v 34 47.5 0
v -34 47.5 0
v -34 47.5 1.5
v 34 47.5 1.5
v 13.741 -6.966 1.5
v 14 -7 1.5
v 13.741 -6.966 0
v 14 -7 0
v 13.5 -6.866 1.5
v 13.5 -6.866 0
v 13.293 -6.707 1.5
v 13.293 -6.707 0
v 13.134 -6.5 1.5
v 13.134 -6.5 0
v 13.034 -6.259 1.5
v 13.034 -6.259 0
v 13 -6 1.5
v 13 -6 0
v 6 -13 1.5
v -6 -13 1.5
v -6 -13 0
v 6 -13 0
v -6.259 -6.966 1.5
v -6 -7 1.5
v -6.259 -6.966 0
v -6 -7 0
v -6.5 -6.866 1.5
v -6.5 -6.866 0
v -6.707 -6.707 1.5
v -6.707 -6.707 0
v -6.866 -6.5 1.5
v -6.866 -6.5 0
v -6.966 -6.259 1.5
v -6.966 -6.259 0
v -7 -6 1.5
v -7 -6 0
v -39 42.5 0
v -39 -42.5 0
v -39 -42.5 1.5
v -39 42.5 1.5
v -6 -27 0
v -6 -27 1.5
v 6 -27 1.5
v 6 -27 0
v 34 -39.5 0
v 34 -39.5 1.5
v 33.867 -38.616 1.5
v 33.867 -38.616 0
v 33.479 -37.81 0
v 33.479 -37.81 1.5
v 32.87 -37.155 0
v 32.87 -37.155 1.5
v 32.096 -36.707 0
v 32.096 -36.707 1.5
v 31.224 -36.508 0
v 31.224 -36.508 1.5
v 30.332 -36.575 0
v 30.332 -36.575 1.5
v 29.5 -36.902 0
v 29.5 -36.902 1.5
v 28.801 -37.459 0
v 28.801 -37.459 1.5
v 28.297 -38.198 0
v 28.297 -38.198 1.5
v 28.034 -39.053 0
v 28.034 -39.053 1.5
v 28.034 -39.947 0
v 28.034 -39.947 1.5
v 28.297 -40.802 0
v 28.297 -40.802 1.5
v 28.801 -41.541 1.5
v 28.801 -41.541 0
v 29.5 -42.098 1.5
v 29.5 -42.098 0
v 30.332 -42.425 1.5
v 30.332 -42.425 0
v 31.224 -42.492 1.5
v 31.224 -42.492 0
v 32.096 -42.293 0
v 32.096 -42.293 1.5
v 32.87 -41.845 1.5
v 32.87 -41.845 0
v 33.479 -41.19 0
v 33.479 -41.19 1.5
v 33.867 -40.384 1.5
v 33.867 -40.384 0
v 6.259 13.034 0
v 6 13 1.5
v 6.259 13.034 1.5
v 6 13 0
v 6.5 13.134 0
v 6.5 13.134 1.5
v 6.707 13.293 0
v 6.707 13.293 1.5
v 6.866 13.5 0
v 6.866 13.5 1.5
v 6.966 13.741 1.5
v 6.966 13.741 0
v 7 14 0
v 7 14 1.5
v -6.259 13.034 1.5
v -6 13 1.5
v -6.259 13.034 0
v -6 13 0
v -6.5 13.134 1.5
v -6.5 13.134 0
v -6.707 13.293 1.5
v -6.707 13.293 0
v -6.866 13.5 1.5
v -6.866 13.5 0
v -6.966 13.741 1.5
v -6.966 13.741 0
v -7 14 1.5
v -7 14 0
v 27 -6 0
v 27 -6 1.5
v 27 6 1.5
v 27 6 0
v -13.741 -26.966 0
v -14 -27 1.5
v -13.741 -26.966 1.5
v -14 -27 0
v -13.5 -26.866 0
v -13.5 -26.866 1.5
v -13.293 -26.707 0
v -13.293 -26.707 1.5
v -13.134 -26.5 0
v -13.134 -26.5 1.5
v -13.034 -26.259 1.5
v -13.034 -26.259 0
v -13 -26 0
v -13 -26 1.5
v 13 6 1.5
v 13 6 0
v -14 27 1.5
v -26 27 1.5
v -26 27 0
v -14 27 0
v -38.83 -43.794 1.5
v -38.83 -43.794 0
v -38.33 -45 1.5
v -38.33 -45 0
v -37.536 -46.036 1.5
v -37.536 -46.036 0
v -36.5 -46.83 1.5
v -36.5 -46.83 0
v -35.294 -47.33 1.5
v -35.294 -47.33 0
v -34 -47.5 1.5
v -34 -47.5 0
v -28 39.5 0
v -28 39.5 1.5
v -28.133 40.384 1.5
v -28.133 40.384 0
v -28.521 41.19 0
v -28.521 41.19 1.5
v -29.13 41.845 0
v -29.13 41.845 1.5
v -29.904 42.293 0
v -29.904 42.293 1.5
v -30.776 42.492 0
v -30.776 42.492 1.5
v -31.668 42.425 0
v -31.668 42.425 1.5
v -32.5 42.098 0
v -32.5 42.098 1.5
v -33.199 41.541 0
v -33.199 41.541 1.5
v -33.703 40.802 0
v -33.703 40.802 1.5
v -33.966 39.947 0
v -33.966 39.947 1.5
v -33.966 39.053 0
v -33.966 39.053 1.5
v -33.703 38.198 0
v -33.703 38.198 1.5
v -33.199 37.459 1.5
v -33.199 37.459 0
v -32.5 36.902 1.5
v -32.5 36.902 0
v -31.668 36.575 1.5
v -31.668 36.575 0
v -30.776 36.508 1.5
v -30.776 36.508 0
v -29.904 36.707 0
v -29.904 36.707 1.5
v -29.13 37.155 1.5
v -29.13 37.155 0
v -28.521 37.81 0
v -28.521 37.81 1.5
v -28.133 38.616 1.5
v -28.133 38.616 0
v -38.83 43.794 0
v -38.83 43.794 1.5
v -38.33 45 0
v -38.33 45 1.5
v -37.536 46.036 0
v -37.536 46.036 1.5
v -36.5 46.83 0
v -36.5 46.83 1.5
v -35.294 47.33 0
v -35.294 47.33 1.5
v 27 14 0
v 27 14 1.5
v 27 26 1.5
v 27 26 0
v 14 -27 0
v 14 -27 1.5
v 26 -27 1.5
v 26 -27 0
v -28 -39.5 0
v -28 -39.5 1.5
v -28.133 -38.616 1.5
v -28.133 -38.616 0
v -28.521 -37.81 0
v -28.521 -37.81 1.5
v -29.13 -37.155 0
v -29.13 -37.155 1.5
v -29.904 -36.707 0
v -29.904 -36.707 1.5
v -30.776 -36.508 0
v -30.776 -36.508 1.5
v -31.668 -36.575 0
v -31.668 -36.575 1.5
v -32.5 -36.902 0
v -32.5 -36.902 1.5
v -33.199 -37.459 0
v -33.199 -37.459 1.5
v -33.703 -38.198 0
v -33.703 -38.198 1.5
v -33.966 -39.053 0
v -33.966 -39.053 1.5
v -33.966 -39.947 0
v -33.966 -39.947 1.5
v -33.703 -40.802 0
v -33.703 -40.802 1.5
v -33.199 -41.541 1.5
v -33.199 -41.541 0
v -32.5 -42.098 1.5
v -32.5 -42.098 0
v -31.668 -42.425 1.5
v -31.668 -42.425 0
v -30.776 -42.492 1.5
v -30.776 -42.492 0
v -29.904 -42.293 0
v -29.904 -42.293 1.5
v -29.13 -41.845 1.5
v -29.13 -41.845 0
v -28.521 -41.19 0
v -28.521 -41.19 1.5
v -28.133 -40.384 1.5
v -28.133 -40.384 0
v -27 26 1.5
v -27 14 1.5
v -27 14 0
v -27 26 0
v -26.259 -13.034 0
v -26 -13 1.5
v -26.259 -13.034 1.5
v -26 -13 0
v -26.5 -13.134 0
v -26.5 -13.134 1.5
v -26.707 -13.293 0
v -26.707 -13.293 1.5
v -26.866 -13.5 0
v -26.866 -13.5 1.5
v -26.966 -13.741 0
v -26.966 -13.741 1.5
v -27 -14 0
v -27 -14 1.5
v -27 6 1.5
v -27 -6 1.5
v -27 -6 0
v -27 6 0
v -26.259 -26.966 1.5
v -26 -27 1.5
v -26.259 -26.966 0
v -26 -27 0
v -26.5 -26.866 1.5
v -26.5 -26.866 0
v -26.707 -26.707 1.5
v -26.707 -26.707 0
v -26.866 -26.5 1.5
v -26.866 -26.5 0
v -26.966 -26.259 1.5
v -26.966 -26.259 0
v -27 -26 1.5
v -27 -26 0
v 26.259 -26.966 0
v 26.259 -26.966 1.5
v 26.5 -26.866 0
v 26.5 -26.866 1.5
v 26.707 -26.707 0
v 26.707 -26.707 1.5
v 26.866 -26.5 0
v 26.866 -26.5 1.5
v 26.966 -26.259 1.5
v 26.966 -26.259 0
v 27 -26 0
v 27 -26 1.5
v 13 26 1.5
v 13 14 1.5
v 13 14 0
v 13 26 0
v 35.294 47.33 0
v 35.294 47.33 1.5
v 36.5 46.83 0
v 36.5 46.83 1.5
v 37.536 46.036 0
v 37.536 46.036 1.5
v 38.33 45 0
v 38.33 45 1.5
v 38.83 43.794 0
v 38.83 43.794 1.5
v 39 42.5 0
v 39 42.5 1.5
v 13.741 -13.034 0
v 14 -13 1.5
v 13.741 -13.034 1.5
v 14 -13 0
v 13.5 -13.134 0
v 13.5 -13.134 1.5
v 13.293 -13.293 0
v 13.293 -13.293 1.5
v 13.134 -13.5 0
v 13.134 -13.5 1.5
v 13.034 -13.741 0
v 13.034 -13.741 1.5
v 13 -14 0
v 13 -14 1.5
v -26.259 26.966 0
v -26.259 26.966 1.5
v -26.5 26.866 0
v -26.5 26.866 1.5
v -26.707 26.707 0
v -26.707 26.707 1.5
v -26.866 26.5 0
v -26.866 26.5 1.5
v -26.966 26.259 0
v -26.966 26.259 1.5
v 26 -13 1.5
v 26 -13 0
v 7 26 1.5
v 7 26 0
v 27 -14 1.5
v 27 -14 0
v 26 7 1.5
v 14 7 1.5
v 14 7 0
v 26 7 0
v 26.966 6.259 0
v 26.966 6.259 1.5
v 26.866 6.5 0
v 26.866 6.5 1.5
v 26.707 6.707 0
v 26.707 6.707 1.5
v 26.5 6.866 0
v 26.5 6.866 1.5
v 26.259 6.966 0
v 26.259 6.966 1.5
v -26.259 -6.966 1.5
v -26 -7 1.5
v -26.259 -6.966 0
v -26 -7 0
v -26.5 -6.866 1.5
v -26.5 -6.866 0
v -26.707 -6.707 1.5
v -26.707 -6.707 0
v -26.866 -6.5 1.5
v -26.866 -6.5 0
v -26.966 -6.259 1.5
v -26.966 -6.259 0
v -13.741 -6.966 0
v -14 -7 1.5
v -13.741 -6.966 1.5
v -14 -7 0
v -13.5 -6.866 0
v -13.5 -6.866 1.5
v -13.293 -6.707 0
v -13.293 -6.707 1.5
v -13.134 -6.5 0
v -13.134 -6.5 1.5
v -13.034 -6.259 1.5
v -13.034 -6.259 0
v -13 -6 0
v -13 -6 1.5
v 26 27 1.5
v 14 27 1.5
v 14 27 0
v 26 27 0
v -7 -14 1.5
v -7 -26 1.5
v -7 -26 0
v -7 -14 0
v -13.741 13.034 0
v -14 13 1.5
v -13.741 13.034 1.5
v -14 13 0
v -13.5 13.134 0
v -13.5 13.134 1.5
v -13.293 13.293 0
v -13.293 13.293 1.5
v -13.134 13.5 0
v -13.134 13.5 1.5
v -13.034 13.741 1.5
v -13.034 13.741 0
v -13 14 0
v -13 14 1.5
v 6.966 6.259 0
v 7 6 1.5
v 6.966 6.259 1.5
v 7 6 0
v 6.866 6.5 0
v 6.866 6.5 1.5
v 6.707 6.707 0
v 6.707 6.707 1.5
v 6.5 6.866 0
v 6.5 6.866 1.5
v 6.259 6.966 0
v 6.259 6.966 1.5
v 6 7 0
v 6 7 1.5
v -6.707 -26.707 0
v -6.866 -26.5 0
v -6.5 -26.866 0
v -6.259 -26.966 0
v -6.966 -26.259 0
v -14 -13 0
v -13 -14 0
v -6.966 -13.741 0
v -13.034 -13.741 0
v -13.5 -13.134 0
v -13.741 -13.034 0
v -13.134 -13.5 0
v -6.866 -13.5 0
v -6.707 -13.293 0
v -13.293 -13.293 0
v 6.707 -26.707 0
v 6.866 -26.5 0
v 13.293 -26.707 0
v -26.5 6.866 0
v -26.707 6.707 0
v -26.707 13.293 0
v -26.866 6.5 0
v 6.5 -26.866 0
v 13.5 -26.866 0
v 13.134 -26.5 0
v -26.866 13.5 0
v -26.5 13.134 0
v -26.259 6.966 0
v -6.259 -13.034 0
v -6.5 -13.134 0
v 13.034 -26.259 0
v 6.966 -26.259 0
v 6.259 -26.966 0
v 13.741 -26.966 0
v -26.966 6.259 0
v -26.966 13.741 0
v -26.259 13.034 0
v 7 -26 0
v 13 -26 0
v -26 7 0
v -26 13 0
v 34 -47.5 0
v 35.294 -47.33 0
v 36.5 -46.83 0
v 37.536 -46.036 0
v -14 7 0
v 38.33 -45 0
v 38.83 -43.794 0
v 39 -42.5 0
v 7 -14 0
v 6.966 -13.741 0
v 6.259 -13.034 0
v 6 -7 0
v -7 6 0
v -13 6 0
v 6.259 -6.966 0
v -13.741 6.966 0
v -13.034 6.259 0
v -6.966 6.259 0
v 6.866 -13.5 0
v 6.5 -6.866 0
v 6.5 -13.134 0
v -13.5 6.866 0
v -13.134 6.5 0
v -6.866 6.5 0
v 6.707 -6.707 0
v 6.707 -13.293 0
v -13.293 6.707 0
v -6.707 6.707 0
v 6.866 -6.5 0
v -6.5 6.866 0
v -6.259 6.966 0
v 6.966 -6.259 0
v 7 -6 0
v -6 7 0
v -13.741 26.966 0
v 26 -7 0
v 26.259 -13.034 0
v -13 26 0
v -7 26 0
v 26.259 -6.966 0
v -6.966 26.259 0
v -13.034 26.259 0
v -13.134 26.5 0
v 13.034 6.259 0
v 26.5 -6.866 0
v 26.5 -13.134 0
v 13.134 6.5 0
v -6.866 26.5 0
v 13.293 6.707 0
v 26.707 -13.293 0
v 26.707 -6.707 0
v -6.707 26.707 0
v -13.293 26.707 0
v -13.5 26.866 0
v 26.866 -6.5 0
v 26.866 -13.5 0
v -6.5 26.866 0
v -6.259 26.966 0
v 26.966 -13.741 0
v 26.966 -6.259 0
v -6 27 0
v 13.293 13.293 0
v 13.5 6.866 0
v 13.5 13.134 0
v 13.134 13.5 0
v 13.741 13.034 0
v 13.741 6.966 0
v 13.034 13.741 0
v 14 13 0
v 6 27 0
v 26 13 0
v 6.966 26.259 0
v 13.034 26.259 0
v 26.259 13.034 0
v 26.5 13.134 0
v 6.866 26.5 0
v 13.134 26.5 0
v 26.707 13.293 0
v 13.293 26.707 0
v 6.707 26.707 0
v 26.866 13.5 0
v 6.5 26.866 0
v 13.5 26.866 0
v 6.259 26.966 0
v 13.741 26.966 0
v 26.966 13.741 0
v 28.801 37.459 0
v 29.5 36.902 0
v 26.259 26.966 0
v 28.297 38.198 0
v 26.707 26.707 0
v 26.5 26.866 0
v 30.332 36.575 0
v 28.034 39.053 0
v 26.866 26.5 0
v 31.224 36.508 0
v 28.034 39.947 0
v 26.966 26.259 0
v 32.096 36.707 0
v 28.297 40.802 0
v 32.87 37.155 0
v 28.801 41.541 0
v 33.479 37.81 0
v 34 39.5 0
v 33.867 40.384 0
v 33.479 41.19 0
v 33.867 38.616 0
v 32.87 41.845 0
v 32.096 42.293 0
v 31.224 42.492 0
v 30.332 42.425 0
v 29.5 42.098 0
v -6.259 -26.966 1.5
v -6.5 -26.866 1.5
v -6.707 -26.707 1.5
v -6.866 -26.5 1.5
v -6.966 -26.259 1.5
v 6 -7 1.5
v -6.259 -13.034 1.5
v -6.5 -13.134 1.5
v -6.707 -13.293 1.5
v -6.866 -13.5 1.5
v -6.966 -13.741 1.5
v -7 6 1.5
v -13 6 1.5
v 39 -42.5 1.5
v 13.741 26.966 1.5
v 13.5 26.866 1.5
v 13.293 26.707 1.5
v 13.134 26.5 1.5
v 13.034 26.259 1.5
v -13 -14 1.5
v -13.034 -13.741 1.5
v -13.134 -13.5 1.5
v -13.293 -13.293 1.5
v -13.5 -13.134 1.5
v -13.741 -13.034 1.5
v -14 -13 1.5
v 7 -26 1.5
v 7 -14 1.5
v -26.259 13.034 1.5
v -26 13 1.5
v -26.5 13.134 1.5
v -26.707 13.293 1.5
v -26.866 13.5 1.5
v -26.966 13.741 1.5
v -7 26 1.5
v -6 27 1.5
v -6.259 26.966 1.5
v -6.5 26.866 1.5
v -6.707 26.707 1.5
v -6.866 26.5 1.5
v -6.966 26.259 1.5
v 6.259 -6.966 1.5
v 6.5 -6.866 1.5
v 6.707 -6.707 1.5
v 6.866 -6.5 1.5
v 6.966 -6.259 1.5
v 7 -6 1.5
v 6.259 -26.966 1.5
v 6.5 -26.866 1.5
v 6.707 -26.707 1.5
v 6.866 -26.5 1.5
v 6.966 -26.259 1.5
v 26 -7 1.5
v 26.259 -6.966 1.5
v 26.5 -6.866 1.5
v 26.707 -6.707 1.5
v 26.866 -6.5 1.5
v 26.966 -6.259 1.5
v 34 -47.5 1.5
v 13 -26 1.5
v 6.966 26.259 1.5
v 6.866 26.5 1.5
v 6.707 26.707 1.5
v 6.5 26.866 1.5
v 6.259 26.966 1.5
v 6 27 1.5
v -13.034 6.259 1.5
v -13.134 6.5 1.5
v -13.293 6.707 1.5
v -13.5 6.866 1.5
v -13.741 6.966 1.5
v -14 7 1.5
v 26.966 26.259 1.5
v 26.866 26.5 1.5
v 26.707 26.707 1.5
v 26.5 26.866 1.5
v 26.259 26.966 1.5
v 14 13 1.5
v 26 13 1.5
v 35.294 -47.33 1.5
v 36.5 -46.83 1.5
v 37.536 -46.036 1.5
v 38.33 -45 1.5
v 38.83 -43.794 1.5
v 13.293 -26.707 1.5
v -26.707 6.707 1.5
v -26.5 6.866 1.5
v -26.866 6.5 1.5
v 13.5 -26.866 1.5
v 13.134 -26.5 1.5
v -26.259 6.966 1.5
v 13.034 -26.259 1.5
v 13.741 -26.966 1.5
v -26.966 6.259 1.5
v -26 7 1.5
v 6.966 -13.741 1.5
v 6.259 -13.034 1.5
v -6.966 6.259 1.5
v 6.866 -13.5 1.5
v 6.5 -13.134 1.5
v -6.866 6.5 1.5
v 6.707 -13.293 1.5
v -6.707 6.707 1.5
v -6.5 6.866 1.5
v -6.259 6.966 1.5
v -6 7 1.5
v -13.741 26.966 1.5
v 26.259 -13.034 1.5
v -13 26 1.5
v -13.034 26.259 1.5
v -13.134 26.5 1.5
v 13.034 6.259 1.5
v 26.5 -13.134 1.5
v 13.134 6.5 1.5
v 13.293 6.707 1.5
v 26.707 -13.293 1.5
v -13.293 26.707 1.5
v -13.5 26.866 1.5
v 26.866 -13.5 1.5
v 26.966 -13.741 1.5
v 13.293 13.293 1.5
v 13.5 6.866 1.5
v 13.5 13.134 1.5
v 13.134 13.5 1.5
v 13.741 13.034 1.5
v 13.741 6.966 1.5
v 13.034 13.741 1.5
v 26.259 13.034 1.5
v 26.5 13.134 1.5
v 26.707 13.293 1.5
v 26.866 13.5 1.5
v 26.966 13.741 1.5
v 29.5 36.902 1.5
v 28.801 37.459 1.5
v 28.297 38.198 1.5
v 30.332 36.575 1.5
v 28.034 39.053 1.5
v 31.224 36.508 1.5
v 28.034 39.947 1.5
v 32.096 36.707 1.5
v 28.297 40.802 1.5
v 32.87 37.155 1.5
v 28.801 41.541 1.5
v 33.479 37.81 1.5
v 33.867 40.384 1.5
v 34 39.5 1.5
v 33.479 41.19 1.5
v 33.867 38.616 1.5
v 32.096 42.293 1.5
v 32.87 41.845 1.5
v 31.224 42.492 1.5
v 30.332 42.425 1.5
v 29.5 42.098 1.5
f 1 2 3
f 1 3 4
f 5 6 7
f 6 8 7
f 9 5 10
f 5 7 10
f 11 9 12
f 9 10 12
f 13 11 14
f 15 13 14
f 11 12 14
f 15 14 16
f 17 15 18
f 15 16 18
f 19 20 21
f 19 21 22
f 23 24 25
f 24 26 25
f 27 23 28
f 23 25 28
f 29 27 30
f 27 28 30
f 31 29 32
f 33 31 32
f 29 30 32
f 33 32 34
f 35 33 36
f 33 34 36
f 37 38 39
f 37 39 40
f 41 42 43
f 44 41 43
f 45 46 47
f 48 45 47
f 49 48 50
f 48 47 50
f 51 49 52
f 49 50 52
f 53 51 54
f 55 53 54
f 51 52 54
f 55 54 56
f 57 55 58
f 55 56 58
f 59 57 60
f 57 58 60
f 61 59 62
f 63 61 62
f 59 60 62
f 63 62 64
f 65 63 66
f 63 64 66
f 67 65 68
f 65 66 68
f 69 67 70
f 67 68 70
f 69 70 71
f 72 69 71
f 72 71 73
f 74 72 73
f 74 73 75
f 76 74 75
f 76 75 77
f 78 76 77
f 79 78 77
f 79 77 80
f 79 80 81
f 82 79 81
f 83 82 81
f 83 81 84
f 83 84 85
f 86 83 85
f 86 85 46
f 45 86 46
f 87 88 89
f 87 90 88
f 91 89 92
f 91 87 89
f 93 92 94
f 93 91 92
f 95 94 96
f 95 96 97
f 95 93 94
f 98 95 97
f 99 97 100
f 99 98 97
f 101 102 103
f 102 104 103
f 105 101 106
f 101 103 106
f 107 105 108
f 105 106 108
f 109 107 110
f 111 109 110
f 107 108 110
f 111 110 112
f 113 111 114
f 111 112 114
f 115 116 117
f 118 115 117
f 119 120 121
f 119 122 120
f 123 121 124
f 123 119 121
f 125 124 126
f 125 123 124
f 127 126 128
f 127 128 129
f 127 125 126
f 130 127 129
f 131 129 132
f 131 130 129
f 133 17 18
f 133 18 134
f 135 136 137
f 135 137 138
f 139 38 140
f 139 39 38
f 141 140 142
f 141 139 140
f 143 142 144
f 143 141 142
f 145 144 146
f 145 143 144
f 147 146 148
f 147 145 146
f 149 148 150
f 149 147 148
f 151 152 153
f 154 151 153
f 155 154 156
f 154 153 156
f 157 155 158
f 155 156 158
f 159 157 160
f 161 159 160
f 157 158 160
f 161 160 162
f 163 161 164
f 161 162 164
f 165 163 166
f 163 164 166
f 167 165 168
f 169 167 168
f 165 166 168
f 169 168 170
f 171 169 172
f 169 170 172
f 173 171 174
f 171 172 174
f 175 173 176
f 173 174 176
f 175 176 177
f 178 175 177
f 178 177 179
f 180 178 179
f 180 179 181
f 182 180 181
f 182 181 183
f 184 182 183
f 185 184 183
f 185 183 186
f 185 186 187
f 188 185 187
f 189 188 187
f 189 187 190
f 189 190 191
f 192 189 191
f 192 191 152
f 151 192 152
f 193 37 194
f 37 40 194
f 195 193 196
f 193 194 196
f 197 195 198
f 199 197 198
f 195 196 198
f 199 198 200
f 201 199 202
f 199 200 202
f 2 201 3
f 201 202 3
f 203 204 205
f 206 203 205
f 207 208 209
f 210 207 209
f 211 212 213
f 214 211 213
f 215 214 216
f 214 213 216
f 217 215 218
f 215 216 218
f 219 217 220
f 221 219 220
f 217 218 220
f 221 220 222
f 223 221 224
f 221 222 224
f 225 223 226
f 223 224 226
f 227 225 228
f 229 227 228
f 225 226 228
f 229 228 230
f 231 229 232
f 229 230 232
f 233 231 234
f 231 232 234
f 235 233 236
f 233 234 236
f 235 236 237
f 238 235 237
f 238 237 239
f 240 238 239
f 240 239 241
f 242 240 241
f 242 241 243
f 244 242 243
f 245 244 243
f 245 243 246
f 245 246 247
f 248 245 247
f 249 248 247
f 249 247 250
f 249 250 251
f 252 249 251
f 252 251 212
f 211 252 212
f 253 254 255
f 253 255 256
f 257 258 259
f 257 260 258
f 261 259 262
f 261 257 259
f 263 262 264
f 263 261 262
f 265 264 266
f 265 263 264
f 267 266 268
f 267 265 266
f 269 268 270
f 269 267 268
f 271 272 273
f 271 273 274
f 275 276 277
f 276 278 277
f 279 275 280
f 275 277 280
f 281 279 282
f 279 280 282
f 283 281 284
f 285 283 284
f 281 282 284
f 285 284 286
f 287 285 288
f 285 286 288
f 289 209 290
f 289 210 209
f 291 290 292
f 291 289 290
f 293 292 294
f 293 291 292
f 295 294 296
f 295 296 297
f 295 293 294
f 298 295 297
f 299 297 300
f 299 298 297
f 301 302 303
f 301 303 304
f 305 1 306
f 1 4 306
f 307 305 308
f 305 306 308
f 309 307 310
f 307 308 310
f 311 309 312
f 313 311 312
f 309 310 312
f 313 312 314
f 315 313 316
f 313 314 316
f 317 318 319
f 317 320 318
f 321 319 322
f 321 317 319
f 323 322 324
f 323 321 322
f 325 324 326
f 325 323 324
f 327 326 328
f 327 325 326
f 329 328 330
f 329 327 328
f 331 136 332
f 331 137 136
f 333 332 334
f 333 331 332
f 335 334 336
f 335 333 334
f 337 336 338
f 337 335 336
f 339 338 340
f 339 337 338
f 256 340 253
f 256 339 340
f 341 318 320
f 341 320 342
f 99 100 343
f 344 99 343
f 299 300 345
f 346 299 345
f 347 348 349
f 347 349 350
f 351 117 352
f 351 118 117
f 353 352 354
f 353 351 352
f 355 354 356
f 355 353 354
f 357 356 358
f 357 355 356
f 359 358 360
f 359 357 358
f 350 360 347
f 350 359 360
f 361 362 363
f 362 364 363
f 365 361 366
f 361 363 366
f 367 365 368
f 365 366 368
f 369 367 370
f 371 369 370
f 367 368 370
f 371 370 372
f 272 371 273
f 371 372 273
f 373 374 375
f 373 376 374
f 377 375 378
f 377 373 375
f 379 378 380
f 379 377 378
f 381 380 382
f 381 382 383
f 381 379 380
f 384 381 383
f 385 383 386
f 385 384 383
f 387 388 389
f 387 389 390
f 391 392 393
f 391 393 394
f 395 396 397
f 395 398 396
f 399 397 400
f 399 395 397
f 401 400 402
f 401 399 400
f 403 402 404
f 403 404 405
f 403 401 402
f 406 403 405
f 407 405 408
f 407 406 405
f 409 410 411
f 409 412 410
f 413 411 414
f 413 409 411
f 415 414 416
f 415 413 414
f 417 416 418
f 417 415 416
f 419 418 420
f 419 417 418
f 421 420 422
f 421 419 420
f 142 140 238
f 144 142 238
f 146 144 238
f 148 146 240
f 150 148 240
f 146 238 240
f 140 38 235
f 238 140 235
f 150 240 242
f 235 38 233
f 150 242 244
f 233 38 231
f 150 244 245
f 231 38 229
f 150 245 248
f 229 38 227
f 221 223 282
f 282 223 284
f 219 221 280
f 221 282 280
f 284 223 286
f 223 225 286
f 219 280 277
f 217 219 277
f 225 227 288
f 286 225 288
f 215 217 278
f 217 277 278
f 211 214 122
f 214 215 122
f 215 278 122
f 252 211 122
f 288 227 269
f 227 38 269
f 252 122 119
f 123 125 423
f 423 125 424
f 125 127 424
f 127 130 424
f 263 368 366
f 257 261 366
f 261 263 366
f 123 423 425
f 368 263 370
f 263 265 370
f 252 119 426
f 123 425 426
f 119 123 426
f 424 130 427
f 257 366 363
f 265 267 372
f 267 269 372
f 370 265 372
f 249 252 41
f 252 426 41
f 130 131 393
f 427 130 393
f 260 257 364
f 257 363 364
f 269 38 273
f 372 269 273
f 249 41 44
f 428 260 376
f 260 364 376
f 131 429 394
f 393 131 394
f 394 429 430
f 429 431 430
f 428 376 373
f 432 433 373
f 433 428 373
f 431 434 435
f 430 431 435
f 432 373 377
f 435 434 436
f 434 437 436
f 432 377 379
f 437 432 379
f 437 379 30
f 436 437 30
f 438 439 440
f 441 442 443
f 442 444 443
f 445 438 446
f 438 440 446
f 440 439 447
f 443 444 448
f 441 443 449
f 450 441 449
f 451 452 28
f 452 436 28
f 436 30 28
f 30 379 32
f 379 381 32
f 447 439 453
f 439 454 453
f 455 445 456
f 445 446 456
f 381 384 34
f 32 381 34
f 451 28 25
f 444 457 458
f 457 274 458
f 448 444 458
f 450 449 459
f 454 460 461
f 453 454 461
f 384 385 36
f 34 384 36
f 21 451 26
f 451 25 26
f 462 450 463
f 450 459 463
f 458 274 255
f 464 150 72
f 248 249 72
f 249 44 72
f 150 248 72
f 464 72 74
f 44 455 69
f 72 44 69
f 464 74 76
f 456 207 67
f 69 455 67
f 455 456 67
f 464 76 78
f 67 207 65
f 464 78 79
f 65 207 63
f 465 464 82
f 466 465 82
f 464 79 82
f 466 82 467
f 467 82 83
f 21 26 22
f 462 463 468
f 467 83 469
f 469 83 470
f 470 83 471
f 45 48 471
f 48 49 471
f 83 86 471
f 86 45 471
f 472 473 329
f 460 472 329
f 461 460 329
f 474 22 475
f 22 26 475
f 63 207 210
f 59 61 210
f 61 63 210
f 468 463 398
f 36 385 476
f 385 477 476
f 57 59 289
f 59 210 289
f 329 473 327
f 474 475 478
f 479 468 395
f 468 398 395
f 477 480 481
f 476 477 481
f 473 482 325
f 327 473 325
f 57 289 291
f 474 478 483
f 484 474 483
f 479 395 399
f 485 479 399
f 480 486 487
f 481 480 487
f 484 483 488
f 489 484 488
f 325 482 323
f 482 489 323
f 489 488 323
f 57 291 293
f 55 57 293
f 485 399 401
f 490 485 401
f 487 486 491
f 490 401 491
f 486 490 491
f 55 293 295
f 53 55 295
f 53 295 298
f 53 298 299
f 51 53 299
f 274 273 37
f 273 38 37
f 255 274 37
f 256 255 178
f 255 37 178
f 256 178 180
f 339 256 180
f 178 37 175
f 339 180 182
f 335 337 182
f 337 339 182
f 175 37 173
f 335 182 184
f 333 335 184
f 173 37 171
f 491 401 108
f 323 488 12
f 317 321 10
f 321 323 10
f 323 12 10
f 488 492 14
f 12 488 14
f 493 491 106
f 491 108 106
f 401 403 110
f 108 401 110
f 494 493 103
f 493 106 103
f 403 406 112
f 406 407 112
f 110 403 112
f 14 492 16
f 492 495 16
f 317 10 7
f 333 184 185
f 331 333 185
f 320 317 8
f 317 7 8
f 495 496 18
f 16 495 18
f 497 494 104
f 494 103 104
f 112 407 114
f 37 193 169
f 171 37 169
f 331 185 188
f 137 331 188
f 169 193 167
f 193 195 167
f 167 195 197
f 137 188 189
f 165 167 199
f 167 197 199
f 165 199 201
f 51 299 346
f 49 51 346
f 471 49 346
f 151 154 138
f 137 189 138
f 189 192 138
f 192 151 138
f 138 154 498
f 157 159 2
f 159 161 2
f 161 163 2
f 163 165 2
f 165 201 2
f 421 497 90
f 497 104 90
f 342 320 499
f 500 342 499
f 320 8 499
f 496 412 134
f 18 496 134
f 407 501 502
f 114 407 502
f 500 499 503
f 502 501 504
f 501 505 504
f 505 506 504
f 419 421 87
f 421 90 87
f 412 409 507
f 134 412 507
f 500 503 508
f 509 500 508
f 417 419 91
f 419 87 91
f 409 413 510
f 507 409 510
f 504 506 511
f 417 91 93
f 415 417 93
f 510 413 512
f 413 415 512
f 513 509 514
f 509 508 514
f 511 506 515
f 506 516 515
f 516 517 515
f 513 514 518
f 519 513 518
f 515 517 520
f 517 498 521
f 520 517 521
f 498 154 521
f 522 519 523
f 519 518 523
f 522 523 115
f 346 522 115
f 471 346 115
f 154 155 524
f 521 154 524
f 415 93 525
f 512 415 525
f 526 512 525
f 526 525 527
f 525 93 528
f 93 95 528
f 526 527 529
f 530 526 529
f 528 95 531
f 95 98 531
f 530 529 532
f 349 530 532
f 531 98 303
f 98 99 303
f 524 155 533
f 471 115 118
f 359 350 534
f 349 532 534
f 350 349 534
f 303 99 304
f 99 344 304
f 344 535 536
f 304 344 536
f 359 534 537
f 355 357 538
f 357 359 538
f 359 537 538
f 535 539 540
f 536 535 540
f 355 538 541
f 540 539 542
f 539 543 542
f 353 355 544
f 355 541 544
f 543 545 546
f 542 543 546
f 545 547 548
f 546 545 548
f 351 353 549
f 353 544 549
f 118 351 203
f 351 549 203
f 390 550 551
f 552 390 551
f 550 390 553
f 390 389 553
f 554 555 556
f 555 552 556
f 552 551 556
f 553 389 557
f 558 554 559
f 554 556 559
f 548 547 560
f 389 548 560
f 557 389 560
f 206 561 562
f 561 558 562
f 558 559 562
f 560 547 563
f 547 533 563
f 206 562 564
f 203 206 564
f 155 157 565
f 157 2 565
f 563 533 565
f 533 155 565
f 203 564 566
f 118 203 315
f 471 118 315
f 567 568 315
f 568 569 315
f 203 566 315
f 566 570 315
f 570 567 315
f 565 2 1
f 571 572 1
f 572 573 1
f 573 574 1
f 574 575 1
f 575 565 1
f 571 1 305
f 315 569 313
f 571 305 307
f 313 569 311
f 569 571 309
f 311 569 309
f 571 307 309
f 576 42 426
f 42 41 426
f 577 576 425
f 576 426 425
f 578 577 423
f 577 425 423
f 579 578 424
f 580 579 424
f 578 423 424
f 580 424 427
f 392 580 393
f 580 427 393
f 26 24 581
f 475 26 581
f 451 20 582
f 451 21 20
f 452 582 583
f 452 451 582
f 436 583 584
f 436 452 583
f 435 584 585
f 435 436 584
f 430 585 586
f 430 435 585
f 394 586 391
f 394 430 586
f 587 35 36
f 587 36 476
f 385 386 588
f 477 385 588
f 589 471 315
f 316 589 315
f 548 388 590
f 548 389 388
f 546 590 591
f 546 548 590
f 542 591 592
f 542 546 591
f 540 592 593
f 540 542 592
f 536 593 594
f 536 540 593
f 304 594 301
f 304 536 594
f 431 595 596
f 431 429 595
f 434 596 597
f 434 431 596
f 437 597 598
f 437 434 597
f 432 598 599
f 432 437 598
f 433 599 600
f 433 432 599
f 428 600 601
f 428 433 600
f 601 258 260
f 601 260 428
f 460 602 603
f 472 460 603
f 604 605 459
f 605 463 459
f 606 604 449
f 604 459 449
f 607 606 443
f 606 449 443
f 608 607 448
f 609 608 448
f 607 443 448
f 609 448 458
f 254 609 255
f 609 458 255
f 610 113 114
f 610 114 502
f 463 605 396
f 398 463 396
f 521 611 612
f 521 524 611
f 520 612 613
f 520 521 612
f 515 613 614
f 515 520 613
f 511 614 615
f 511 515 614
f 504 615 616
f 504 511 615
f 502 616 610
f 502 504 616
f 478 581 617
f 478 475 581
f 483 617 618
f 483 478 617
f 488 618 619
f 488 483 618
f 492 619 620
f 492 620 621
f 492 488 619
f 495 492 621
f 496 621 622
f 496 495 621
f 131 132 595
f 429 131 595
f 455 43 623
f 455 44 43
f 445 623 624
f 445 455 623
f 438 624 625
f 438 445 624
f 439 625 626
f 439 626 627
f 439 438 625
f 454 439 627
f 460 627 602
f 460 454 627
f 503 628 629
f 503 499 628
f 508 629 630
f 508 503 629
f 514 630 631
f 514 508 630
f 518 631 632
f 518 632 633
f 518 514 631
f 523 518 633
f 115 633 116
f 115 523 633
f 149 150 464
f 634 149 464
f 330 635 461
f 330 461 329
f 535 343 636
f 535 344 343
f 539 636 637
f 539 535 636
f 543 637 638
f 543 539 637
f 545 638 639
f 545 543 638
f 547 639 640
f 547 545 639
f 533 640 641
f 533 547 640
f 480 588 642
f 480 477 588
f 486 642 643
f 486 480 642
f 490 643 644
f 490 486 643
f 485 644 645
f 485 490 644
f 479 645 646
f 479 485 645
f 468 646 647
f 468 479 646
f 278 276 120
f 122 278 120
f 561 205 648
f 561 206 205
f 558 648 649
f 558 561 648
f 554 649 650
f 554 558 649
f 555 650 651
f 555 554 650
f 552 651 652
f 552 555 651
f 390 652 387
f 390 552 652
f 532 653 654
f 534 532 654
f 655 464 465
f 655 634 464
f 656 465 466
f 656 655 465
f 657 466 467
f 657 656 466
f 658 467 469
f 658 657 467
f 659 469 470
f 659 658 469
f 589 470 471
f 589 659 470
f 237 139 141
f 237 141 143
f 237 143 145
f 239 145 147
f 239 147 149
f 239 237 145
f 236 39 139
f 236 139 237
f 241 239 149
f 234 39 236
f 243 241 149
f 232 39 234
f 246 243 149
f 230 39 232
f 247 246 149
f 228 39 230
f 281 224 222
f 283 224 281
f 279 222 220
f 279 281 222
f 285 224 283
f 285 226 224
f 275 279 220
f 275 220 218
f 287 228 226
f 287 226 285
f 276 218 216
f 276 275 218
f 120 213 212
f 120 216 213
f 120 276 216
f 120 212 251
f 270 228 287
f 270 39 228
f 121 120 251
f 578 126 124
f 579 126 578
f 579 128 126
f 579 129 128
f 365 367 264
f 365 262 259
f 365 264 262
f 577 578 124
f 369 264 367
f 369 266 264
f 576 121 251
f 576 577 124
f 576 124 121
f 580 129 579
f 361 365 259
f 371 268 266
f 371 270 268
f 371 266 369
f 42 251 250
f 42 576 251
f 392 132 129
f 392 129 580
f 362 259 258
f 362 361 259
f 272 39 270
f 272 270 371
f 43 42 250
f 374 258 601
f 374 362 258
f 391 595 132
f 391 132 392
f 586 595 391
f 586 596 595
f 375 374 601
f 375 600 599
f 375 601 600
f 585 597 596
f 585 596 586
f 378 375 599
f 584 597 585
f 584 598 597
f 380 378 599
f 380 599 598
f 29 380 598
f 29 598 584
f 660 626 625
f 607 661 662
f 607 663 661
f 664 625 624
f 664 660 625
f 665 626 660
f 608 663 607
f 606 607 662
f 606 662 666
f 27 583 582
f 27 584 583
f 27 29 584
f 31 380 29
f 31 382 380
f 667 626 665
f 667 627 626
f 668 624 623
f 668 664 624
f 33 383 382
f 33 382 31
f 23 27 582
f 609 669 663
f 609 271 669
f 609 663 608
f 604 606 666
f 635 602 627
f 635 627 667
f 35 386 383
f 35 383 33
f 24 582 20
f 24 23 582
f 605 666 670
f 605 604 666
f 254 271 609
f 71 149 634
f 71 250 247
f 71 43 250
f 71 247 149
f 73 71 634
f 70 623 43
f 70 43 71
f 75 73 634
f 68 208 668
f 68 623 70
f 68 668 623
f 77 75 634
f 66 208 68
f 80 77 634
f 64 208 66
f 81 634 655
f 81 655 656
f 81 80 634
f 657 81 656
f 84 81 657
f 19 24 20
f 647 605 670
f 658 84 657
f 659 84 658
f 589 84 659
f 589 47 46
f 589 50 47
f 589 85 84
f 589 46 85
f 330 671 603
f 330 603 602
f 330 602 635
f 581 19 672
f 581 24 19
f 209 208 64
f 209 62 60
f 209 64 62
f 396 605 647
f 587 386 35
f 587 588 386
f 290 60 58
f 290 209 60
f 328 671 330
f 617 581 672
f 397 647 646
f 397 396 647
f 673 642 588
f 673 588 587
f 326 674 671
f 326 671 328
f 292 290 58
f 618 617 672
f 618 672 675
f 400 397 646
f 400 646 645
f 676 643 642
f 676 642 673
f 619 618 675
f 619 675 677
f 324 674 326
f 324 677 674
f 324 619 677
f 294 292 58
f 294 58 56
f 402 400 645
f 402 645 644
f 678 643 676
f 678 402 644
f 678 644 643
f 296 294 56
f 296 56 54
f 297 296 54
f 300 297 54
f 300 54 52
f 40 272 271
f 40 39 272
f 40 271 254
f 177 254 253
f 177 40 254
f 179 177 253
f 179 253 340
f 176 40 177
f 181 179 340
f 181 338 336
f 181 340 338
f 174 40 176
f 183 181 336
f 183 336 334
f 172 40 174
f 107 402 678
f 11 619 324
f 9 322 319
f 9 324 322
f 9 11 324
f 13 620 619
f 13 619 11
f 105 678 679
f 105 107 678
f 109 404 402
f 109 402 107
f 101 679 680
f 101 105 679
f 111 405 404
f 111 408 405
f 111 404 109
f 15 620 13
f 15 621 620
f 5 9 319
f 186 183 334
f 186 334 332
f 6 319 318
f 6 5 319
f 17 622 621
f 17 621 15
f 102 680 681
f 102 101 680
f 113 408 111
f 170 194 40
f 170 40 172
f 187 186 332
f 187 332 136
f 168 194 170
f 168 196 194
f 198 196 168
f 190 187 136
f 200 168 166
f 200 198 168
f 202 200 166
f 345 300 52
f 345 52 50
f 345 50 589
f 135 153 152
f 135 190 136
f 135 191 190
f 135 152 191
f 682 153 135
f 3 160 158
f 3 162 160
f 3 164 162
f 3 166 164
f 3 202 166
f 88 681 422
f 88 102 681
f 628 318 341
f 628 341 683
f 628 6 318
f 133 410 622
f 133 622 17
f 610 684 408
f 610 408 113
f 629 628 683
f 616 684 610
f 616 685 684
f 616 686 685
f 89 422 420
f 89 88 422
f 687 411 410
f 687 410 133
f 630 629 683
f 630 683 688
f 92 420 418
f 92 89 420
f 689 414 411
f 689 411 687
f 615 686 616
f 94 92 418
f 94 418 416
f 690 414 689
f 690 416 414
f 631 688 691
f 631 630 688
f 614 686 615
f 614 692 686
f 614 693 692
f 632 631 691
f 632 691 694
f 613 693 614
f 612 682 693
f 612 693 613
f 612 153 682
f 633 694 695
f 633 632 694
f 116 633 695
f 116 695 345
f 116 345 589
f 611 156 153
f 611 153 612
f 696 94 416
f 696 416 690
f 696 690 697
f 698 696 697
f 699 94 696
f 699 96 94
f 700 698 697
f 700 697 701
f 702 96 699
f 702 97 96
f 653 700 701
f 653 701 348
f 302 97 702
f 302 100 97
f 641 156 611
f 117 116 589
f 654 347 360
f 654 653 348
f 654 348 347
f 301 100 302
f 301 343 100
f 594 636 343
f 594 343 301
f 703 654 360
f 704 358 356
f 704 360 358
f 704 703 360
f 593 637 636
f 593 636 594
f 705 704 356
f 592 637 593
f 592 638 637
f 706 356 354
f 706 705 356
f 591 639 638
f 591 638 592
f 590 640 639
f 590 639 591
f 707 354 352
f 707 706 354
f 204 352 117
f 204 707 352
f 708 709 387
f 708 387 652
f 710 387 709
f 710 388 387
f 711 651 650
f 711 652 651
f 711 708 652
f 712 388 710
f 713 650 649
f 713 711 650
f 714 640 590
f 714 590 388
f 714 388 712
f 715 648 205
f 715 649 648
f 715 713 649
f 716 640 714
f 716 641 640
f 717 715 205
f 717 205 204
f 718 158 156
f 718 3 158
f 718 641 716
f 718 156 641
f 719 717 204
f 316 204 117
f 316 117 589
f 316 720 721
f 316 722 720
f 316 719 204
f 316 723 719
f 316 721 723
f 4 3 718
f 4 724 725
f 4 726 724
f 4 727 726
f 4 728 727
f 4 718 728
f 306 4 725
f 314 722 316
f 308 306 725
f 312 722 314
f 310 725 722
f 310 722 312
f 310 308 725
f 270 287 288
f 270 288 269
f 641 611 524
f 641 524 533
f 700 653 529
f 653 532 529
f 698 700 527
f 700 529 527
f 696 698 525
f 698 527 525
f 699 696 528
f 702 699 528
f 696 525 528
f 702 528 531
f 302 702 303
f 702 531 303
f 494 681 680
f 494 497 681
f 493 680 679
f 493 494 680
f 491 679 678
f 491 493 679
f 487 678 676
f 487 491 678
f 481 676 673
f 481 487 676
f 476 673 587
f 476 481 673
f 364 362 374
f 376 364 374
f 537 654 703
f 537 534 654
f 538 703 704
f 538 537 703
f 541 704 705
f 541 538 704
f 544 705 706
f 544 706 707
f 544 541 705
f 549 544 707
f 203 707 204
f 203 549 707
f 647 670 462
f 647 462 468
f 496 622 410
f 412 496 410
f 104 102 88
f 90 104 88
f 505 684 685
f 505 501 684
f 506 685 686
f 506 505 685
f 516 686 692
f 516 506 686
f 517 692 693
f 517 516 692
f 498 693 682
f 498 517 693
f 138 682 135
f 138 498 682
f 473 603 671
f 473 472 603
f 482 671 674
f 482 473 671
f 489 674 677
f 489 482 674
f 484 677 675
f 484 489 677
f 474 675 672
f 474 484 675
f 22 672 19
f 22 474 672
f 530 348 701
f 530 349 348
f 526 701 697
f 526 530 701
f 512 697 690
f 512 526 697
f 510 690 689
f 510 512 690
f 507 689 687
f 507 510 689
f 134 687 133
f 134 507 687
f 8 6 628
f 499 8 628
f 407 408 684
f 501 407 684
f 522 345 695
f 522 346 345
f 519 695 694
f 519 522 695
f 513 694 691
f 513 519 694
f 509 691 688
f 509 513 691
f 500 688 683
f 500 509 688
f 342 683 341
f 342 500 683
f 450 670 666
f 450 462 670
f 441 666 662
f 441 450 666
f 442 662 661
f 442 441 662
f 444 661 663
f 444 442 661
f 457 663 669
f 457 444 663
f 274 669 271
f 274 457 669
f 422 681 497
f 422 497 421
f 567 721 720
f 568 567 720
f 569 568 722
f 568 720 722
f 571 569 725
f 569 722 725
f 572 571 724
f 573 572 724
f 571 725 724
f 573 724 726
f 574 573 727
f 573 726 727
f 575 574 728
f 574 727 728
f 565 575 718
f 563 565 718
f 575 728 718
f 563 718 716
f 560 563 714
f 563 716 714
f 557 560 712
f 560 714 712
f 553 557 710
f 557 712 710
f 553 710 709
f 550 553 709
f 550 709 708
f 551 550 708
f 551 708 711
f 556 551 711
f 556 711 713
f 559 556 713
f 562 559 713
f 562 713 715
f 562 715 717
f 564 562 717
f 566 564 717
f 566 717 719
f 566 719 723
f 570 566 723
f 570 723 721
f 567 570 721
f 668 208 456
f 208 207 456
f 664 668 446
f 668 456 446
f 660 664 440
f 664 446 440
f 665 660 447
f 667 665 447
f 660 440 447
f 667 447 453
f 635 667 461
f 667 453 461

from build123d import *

# Parameters (mm, degrees)
SKETCH_W        = 78
SKETCH_H        = 95
PAD_DEPTH       = 1.5
SKETCH002_W     = 14
SKETCH002_H     = 14
POCKET_DEPTH    = 1.501
FILLET_R        = 1
SKETCH003_R     = 3
POCKET001_DEPTH = 1.501
FILLET001_R     = 5


with BuildPart() as part:
    # Sketch → Pad (new body)
    with BuildSketch(Plane.XY):
        Rectangle(SKETCH_W, SKETCH_H)
    extrude(amount=PAD_DEPTH)

    # Sketch002 (on Face6 of Pad) → Pocket (cut, through all)
    with BuildSketch(Plane.XY.offset(1.5)):
        with Locations((-20, 20)):
            Rectangle(SKETCH002_W, SKETCH002_H)
        with Locations((0, 20)):
            Rectangle(SKETCH002_W, SKETCH002_H)
        with Locations((20, 20)):
            Rectangle(SKETCH002_W, SKETCH002_H)
        with Locations((-20, 0)):
            Rectangle(SKETCH002_W, SKETCH002_H)
        Rectangle(SKETCH002_W, SKETCH002_H)
        with Locations((20, 0)):
            Rectangle(SKETCH002_W, SKETCH002_H)
        with Locations((-20, -20)):
            Rectangle(SKETCH002_W, SKETCH002_H)
        with Locations((0, -20)):
            Rectangle(SKETCH002_W, SKETCH002_H)
        with Locations((20, -20)):
            Rectangle(SKETCH002_W, SKETCH002_H)
    extrude(amount=-POCKET_DEPTH, mode=Mode.SUBTRACT)

    # Fillet
    fillet_edges = [part.edges().sort_by_distance(p)[0] for p in [
        (-27, 27, 0.75),
        (-27, 7, 0.75),
        (-27, -13, 0.75),
        (-7, 27, 0.75),
        (-7, 7, 0.75),
        (-7, -13, 0.75),
        (13, -13, 0.75),
        (13, 7, 0.75),
        (13, 27, 0.75),
        (-13, 27, 0.75),
        (7, 27, 0.75),
        (27, 27, 0.75),
        (-13, 7, 0.75),
        (7, 7, 0.75),
        (27, 7, 0.75),
        (-13, -13, 0.75),
        (7, -13, 0.75),
        (27, -13, 0.75),
        (27, 13, 0.75),
        (7, 13, 0.75),
        (-13, 13, 0.75),
        (27, -7, 0.75),
        (7, -7, 0.75),
        (-13, -7, 0.75),
        (27, -27, 0.75),
        (7, -27, 0.75),
        (-13, -27, 0.75),
        (13, -27, 0.75),
        (-7, -27, 0.75),
        (-27, -27, 0.75),
        (13, -7, 0.75),
        (-7, -7, 0.75),
        (-27, -7, 0.75),
        (13, 13, 0.75),
        (-7, 13, 0.75),
        (-27, 13, 0.75),
    ]]
    fillet(fillet_edges, radius=FILLET_R)

    # Sketch003 (on Face78 of Fillet) → Pocket001 (cut, through all)
    with BuildSketch(Plane.XY.offset(1.5)):
        with Locations((-31, 39.5)):
            Circle(SKETCH003_R)
        with Locations((31, 39.5)):
            Circle(SKETCH003_R)
        with Locations((31, -39.5)):
            Circle(SKETCH003_R)
        with Locations((-31, -39.5)):
            Circle(SKETCH003_R)
    extrude(amount=-POCKET001_DEPTH, mode=Mode.SUBTRACT)

    # Fillet001
    fillet001_edges = [part.edges().sort_by_distance(p)[0] for p in [
        (39, -47.5, 0.75),
        (-39, -47.5, 0.75),
        (-39, 47.5, 0.75),
        (39, 47.5, 0.75),
    ]]
    fillet(fillet001_edges, radius=FILLET001_R)


solid = part.part
